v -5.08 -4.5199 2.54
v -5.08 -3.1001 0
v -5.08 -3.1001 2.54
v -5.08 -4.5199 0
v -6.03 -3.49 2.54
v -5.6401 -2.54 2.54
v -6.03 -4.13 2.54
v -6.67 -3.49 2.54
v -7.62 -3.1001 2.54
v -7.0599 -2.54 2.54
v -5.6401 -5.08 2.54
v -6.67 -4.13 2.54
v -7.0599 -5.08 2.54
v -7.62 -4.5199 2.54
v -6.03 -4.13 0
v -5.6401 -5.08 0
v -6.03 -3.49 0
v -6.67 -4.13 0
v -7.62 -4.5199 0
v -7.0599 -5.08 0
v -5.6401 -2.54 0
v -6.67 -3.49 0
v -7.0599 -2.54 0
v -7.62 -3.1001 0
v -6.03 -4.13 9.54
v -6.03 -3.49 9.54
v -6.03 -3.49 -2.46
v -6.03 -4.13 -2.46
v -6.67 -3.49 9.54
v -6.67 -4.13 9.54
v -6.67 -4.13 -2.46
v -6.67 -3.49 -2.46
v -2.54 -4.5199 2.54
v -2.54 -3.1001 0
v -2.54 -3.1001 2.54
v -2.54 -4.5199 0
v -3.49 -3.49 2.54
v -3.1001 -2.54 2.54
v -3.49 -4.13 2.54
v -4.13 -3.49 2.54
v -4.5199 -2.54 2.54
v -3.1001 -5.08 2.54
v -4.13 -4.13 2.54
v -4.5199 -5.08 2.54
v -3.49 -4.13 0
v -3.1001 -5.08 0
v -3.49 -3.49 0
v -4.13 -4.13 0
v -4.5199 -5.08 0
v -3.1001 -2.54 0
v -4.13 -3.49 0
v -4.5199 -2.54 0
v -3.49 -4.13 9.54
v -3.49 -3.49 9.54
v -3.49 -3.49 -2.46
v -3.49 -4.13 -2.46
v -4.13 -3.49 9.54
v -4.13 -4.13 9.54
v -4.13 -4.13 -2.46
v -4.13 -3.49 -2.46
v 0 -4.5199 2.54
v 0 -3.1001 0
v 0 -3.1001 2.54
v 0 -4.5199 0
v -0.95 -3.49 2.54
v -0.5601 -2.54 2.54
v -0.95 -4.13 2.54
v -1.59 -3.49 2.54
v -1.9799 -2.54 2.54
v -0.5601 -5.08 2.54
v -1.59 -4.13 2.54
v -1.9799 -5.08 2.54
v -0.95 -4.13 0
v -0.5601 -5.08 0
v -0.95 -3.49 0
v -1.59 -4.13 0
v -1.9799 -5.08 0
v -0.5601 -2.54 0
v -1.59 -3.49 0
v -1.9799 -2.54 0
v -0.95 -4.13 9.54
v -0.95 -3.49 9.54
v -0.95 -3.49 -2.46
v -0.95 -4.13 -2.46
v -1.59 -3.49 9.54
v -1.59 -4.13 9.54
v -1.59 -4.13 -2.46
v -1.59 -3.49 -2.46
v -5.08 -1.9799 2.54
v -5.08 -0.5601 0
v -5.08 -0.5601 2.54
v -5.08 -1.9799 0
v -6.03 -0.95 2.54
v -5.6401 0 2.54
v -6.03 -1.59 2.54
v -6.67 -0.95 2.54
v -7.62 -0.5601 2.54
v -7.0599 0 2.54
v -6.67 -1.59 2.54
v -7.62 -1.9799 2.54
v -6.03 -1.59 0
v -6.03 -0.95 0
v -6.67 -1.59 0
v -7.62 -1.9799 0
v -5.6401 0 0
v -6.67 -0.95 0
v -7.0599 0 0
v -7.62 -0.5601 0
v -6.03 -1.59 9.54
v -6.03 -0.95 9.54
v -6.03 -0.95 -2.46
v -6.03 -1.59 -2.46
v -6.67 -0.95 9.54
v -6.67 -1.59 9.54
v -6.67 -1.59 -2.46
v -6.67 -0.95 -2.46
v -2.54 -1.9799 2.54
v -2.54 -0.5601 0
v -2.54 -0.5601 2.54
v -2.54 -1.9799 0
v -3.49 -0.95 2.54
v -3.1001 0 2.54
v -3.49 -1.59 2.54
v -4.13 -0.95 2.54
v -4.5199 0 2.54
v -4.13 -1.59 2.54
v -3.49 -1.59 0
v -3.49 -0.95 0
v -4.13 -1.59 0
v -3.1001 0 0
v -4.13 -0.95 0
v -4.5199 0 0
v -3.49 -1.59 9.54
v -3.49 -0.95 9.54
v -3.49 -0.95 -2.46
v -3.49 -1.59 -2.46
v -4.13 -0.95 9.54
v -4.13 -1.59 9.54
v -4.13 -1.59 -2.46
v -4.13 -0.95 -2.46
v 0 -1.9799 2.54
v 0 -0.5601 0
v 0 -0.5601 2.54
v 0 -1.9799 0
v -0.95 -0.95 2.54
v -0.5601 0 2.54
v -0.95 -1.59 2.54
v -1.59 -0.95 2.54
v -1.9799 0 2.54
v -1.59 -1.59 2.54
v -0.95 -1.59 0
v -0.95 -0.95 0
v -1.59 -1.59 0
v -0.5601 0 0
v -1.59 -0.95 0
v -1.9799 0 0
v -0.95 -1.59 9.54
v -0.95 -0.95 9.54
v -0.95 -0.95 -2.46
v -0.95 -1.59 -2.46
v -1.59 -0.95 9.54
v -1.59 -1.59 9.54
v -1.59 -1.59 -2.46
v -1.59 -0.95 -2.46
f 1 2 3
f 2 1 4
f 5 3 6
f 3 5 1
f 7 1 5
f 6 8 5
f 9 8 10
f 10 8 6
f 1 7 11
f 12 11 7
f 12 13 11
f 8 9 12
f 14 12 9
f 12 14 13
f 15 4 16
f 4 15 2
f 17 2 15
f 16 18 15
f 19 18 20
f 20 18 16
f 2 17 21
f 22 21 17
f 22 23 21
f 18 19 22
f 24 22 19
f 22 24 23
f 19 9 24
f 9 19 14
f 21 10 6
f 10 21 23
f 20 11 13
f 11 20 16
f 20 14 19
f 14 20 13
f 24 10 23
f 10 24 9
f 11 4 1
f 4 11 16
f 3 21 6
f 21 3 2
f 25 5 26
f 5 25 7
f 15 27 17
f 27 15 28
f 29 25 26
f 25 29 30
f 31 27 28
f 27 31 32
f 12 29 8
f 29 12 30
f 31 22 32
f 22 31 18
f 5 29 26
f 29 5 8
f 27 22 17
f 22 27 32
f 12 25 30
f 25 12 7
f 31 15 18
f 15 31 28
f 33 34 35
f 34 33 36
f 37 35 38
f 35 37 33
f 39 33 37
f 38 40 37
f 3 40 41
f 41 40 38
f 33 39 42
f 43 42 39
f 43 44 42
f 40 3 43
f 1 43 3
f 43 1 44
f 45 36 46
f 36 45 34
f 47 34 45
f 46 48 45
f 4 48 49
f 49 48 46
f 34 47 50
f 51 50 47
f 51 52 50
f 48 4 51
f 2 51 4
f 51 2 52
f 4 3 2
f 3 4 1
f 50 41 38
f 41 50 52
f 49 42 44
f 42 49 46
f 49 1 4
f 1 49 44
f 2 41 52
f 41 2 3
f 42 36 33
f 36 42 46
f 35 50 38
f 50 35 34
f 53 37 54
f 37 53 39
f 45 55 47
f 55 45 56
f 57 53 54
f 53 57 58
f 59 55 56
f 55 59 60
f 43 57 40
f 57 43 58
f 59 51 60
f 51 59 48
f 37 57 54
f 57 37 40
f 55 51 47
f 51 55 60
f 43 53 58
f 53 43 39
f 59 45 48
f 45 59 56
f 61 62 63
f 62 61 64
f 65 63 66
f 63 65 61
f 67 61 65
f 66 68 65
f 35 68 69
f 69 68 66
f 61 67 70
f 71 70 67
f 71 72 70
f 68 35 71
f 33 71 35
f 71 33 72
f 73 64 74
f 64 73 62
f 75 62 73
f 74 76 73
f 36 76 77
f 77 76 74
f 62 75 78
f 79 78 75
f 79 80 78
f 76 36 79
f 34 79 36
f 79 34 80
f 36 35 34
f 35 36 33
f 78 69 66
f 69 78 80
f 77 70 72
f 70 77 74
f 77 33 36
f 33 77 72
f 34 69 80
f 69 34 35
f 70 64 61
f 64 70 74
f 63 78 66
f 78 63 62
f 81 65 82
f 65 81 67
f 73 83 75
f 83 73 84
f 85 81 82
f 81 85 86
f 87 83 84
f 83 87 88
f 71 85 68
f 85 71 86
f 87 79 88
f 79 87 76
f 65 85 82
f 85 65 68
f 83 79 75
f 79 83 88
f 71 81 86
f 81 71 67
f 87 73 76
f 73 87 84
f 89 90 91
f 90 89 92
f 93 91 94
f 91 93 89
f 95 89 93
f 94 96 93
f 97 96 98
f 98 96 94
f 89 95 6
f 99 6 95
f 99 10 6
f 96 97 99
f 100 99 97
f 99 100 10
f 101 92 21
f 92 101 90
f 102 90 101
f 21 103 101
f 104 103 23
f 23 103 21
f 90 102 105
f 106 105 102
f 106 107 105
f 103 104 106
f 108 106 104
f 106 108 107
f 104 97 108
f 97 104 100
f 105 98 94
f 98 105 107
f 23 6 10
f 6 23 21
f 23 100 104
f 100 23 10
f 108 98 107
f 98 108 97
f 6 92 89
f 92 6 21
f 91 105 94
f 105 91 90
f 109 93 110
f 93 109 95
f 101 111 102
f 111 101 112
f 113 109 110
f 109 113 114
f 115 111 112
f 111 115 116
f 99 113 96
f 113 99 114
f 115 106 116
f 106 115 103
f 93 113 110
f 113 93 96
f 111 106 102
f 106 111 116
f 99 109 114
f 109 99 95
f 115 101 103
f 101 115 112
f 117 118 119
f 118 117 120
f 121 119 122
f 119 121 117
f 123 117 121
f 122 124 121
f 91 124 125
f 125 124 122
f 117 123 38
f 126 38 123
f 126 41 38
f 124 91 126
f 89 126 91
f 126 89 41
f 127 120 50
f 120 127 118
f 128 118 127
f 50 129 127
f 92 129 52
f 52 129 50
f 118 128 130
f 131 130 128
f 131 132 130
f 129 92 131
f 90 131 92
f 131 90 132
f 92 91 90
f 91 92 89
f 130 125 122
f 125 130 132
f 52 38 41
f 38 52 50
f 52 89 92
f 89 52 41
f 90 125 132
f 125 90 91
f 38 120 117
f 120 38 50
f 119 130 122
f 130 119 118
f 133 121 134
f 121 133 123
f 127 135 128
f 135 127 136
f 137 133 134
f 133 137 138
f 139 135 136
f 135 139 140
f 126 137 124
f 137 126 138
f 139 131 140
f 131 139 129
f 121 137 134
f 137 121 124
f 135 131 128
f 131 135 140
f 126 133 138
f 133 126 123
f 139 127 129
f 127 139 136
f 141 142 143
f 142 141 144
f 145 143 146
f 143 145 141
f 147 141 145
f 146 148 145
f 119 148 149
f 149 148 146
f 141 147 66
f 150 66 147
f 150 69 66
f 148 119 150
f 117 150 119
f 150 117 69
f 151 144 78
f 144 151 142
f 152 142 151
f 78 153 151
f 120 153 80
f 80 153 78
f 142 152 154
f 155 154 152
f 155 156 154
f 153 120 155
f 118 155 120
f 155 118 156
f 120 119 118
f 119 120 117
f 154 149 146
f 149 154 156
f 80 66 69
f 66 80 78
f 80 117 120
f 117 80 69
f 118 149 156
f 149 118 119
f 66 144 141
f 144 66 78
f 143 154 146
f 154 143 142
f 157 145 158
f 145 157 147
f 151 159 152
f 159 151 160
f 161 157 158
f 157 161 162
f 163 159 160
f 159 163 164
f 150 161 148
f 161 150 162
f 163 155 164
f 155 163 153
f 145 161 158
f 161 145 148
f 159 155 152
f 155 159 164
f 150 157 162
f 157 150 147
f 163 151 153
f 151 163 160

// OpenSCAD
// pin_headers.scad
//
// Model of through-hole pin headers.
//
// Units are metric
//
// "height" is the total length of the pin. Default is 12mm.
// "upper" is the length of the pin above the stopper. Default is 7mm.
// "rows" is the number of rows. Default is 3.
// "cols" is the number of columns. Default is 2.
//
// Examples:
// pin_header( 12, 7, 2, 5);
// pin_header( rows=5 cols=1 );
// By Paul McGovern

module off_pin_header(height=12, upper=7, rows=3, cols=2) {
cl = 2.54;
translate( [ -(rows  * cl/2 ), -(cols  * cl/2 ), 0 ] )
pin_header(height, upper, rows,cols);
}

module pin_header( height=12, upper=7, rows=3, cols=2 ) {

	cl = 2.54;

	translate( [ -(rows  * cl/2 ) + cl /2, -(cols  * cl/2 ) + cl /2, 0 ] ) {

		for( col = [0: cols -1 ] ) {
			for( row = [0 : rows -1 ] ) {

				translate( [ cl * row , cl * col, 0] ) {

					color( "gray" )
						translate( [0,0, cl / 2]) {
							intersection() {
								cube( [ cl, cl, cl ], center=true );
								rotate( [0, 0, 45] ) cube( [ 2.8, 2.8, cl ], center=true );
						}
				}

				color( "gold" ) {
					translate( [0,0, (upper - ( height/2 )) + cl ] ) {
						union() {
							cube( [0.64,0.64,height], center=true );
							translate( [0,0, height/2 ] ) scale( 0.64 ) _pin_point();
							translate( [0,0, -height/2 ] ) scale( 0.64 )	rotate([180,0,0] )_pin_point();
						}
					}
				}
			}
		}
	}
}
}

module _pin_point() {
     * translate( [-0.5,-0.5, 0])
		polyhedron(
			points=[[0,0,0],[0,1,0],[1,1,0],[1,0,0],[0.5,0.5,0.5]],
			faces=[[0,1,2],[0,2,3],[0,1,4],[1,2,4],[2,3,4],[3,0,4]]);
}

off_pin_header();
// %pin_header();
